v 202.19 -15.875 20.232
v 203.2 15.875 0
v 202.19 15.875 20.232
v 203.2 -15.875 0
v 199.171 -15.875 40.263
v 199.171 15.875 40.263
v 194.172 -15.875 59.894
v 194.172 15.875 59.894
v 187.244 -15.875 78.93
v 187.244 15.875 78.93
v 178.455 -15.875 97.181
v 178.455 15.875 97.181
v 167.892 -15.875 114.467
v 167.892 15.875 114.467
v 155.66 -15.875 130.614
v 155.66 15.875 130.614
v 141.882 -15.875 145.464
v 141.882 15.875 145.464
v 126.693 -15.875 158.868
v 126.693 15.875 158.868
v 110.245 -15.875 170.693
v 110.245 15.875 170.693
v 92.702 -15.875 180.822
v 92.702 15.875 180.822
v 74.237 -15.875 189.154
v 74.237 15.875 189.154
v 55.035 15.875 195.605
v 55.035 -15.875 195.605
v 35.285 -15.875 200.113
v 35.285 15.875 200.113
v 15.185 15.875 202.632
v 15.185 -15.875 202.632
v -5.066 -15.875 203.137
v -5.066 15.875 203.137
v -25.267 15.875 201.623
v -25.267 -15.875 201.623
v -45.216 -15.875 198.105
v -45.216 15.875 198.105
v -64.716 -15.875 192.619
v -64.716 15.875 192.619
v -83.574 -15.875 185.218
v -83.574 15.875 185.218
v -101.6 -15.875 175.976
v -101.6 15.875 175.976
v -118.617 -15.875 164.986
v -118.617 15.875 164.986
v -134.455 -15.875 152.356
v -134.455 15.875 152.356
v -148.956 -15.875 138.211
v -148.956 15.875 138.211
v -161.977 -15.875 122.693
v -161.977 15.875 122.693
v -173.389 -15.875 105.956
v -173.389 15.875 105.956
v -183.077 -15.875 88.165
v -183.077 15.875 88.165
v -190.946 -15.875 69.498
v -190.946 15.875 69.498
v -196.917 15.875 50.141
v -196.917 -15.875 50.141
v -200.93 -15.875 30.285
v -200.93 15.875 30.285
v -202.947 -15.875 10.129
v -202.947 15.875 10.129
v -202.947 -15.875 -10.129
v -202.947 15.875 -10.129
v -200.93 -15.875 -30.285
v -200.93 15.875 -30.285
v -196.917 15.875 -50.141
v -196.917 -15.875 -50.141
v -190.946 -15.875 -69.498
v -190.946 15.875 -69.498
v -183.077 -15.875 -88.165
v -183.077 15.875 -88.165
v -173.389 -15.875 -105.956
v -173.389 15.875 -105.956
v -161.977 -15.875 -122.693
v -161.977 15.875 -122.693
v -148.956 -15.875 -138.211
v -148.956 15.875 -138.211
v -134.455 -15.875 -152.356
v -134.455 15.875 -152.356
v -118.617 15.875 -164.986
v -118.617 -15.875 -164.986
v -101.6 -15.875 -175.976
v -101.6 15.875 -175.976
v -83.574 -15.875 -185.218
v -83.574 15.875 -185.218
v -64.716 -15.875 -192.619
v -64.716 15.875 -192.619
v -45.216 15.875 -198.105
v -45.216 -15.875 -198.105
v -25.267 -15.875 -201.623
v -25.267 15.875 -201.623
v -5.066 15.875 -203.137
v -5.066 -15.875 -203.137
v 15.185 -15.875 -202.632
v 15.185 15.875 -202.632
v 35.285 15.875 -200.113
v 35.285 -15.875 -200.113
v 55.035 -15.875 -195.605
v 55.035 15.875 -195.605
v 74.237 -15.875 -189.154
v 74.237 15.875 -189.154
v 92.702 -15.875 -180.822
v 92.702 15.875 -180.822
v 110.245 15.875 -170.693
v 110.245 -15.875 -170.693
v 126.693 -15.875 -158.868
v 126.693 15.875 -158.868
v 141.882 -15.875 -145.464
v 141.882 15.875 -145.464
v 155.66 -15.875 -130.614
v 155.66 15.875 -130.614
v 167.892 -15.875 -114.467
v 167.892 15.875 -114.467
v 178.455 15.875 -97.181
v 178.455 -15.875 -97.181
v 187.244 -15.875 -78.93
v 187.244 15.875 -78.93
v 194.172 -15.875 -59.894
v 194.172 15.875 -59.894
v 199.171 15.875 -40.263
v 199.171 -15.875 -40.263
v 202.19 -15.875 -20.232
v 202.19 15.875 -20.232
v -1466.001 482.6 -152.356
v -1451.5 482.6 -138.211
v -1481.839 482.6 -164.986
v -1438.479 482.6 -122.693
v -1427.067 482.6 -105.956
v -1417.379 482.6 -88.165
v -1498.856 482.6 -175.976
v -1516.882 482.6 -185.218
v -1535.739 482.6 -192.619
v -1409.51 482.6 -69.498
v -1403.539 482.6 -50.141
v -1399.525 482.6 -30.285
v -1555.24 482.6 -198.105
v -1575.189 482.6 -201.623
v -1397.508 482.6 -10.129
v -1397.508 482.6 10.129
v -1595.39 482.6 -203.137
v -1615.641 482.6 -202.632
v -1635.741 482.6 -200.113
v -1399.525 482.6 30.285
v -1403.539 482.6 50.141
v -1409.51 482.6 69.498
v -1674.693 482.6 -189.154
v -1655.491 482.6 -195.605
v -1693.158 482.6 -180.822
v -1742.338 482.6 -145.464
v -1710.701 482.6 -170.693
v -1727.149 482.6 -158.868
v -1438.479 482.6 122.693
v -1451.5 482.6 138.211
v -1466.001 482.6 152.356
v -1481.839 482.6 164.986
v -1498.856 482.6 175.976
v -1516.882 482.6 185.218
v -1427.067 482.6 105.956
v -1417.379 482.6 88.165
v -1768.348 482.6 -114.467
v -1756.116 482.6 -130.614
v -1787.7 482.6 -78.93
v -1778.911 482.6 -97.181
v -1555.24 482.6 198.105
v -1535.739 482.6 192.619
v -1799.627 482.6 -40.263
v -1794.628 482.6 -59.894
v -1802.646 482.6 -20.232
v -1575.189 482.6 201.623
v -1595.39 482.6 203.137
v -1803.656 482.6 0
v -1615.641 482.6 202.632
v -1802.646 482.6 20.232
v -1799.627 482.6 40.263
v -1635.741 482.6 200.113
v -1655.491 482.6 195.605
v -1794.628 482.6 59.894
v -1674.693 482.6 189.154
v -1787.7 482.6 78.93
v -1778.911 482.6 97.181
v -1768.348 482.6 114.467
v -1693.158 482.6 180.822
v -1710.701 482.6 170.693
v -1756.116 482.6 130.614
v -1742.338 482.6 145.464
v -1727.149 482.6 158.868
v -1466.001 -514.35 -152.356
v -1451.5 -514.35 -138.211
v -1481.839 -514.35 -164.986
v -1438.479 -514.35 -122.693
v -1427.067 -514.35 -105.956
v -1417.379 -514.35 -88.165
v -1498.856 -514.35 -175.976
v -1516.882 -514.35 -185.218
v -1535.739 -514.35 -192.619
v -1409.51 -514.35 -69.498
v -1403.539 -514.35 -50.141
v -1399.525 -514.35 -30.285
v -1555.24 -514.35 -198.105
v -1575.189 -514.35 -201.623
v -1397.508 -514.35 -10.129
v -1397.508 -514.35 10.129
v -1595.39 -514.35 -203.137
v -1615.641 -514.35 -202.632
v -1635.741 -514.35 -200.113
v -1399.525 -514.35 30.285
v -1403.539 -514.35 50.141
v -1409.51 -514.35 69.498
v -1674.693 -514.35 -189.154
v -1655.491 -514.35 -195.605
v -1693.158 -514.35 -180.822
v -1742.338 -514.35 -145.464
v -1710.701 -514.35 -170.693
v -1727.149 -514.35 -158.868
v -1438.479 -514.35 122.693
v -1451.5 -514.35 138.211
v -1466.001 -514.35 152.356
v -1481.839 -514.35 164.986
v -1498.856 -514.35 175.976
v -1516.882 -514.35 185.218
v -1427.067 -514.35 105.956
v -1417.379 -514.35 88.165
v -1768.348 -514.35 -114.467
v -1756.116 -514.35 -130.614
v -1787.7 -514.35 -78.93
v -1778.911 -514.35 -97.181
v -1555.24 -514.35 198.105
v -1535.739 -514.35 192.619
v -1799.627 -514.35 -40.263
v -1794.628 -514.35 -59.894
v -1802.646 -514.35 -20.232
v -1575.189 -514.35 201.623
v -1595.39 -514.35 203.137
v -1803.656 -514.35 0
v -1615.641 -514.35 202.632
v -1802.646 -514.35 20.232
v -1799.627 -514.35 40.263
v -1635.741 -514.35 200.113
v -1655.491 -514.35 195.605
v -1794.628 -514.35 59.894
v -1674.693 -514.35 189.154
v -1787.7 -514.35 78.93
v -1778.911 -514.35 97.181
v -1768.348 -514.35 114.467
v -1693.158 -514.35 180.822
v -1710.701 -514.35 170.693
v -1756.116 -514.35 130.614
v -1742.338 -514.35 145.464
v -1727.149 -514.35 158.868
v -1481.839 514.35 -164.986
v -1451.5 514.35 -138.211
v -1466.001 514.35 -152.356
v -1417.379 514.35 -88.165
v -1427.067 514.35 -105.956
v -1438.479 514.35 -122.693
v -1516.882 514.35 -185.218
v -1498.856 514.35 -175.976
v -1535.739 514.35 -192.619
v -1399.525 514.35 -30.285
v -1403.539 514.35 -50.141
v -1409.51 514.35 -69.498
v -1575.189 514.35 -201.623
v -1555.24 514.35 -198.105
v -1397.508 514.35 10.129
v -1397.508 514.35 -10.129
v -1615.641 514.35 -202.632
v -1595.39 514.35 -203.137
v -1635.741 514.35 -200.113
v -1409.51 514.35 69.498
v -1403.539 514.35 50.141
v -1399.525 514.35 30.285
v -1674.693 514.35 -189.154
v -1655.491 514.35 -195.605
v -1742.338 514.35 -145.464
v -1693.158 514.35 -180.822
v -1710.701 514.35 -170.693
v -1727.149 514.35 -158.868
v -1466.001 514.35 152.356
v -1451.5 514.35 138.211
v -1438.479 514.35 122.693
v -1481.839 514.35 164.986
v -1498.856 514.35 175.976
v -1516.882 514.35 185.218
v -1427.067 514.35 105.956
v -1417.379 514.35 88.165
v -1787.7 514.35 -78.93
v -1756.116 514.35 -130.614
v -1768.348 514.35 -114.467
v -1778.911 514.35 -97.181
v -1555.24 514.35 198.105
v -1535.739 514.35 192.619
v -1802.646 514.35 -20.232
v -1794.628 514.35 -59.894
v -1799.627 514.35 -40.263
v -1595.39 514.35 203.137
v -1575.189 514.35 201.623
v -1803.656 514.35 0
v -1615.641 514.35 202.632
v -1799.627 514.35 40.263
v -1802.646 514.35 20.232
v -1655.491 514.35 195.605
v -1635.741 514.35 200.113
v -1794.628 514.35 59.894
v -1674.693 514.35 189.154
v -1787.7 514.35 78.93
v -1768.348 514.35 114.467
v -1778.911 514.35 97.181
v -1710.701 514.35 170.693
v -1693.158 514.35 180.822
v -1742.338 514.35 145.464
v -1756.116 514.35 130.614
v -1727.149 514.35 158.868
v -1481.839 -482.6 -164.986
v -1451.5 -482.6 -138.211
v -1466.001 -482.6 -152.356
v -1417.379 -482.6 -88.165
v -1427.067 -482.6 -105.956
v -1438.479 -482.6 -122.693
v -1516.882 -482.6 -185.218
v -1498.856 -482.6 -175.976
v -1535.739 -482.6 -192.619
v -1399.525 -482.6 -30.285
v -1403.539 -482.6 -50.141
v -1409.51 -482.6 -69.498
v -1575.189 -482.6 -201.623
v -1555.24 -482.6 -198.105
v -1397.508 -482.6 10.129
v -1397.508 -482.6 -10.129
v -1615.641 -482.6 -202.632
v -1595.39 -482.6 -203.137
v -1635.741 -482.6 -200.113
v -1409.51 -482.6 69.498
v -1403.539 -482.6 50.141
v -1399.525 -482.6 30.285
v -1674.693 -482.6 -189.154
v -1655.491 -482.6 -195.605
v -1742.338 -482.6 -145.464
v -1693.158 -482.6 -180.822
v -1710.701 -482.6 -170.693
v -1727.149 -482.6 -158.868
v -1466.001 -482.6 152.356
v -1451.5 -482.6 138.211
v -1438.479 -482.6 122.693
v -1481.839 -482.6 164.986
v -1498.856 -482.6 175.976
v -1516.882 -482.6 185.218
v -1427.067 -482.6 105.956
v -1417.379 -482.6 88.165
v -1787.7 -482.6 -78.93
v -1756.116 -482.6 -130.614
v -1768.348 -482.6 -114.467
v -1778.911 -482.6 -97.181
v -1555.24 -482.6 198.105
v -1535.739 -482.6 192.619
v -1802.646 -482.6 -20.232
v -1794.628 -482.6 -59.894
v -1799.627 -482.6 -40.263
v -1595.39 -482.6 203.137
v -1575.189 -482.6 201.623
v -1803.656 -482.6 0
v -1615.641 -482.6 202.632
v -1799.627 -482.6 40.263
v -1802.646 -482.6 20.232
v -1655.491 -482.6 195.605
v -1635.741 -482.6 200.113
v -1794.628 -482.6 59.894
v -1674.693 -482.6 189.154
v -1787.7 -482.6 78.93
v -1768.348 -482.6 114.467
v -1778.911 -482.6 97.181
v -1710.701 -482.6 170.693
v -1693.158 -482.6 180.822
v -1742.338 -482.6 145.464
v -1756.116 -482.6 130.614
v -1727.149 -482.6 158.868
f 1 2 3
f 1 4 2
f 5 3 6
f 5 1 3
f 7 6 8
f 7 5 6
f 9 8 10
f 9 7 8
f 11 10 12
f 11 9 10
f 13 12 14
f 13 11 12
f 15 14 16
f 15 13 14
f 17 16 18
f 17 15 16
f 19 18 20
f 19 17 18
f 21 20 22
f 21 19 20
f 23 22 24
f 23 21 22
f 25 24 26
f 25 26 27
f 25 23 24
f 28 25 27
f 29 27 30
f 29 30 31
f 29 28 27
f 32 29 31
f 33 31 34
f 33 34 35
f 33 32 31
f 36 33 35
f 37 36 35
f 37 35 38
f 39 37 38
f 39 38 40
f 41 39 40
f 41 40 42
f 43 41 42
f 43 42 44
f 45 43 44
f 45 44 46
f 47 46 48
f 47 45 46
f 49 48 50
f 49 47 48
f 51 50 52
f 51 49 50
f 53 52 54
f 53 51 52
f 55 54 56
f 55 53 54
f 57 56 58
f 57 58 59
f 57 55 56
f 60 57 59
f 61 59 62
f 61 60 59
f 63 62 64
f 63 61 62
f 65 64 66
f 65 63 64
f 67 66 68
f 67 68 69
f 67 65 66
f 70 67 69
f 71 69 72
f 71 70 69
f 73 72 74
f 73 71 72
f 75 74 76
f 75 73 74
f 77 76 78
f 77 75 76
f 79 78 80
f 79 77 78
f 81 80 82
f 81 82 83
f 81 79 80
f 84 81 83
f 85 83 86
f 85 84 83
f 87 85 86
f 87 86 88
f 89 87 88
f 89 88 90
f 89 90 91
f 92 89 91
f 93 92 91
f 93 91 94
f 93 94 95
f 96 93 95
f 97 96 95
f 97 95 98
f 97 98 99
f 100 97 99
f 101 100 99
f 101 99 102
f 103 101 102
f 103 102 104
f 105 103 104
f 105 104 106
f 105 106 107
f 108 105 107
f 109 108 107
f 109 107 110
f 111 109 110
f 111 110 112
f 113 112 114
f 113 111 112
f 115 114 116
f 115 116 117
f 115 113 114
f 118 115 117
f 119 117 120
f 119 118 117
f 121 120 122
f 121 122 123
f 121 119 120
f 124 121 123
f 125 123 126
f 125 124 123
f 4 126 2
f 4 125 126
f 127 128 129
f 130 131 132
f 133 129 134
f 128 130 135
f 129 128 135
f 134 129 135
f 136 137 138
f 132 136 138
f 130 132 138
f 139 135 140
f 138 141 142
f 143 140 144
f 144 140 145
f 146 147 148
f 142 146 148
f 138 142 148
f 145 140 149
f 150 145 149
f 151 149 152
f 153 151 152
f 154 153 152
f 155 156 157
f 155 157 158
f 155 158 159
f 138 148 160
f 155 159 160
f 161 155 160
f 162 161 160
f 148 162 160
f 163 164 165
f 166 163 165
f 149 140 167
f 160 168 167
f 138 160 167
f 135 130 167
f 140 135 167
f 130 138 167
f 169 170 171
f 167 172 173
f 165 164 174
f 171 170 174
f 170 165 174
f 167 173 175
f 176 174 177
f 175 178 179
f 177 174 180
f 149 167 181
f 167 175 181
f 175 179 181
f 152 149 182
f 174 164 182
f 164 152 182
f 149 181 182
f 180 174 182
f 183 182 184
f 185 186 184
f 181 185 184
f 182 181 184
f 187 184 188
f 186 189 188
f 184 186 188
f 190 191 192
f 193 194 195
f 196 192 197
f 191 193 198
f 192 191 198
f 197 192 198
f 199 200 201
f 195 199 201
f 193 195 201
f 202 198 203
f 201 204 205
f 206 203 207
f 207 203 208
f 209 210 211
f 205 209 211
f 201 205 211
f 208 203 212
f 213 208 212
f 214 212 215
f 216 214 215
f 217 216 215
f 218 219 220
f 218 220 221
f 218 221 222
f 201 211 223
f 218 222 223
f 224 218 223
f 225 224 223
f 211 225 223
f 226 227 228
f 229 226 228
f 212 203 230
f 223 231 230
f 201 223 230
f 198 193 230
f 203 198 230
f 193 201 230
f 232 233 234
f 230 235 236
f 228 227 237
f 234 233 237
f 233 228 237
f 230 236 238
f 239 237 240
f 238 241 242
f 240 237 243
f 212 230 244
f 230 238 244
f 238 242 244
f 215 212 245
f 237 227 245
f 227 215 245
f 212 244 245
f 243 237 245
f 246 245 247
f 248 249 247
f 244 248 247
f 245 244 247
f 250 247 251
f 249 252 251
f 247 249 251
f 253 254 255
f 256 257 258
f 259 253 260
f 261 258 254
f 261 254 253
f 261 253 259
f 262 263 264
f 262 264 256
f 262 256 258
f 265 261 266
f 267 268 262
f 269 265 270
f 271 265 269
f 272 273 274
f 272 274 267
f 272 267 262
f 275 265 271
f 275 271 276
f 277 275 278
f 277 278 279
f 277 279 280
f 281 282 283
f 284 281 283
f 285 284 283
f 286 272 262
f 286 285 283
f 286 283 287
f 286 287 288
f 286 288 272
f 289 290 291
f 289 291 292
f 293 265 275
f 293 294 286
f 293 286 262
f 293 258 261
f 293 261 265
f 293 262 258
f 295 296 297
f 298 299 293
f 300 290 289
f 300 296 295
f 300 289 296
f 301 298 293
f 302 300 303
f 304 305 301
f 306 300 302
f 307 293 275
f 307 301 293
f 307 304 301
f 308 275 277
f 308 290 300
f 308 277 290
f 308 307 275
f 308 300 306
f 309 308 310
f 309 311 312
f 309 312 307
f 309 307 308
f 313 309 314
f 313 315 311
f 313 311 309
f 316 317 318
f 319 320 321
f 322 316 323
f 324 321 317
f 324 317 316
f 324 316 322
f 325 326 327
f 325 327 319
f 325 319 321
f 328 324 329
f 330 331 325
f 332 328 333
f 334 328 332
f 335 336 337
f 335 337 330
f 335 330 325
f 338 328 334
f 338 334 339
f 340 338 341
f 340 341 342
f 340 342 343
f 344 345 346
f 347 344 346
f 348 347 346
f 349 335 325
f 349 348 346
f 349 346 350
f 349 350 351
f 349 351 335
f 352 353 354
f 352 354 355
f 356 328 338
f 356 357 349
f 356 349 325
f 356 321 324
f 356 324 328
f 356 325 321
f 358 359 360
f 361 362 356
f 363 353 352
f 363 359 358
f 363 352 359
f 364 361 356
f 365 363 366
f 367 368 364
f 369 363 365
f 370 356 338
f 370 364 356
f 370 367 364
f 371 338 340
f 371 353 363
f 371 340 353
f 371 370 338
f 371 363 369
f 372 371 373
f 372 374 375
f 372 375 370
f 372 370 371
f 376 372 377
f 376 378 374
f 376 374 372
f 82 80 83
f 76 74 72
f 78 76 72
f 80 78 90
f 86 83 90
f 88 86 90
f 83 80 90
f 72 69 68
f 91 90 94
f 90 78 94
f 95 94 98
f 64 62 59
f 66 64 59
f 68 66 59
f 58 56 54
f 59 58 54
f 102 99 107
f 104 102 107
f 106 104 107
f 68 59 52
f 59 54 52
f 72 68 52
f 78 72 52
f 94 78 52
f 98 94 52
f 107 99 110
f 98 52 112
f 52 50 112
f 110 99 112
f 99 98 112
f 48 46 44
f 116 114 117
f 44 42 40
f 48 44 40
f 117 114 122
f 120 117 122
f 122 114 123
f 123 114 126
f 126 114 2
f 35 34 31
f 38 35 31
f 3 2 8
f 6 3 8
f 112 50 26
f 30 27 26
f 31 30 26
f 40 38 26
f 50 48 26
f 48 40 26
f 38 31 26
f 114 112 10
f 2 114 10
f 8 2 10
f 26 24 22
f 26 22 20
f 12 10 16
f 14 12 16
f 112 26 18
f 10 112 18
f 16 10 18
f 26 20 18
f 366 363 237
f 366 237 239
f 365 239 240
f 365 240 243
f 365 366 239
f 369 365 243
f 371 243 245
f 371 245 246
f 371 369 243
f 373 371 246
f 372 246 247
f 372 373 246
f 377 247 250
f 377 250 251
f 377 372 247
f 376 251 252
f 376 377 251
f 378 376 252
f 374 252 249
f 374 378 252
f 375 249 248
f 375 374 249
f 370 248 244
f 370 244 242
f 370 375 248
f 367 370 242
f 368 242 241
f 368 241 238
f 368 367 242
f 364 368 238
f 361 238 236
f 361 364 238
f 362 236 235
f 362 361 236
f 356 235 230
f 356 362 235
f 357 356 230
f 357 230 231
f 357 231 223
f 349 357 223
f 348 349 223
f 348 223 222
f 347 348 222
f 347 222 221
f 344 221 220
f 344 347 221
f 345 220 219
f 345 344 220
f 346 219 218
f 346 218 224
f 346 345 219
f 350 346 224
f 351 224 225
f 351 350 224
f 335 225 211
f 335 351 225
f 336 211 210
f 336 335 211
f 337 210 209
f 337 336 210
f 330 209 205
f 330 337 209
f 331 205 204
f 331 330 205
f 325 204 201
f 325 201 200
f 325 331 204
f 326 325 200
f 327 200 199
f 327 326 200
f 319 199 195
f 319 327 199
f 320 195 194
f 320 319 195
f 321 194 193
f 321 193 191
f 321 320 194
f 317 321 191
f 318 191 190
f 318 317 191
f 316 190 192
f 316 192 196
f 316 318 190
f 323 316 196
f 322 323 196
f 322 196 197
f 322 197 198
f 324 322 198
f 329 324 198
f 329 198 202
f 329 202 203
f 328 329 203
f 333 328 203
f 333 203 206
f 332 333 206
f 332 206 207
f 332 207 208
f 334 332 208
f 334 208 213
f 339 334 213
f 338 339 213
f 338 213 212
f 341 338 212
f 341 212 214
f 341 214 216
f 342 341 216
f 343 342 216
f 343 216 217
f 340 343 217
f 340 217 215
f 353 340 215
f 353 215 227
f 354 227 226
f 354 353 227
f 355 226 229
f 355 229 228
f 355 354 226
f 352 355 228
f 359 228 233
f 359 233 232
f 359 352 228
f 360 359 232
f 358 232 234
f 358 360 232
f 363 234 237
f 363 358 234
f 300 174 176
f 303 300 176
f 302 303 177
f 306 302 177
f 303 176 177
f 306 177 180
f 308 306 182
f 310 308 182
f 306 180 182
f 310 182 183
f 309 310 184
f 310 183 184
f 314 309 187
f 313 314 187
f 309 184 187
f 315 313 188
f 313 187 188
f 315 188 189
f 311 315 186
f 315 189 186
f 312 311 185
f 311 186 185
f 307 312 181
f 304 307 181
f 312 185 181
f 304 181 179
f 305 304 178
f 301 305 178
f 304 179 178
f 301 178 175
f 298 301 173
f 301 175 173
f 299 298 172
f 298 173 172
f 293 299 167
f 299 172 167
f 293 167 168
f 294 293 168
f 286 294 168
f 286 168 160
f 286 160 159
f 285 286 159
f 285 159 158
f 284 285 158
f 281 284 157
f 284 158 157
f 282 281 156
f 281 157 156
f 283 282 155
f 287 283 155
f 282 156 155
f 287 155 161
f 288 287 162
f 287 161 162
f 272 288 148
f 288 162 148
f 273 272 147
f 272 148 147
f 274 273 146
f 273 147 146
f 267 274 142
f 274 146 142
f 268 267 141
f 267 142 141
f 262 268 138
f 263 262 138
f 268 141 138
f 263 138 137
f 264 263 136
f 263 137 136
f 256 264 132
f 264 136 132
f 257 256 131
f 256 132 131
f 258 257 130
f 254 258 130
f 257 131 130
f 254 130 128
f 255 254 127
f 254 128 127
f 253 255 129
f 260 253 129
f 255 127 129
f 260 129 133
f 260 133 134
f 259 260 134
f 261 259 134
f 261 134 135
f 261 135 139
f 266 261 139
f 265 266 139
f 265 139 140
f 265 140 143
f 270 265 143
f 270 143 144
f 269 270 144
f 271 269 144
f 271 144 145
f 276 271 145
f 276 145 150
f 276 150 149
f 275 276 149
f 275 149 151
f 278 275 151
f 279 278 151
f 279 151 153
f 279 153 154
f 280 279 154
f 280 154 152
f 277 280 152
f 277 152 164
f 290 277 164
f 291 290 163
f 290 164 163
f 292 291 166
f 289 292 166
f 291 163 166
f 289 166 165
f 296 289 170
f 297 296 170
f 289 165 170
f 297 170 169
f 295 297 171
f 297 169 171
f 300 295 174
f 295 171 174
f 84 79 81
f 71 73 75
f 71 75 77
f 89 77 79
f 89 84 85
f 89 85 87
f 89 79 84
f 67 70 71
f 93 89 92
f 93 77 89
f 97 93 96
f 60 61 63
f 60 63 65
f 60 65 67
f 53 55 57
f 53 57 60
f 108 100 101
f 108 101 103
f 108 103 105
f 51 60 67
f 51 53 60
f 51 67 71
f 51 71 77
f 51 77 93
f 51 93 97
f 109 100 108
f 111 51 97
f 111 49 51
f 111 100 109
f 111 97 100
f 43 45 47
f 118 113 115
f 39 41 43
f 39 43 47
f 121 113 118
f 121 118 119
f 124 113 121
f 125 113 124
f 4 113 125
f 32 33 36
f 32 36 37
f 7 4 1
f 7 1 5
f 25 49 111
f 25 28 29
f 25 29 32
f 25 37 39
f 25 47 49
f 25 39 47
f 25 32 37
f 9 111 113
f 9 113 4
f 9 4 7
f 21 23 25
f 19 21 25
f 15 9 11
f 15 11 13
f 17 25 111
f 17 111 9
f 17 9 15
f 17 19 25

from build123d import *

# Parameters (mm, degrees)
F0_R      = 203.2
F1_DEPTH  = 15.875
F7_R      = 203.2
F8_DEPTH  = 31.75
F9_R      = 203.2
F10_DEPTH = 31.75


# Not quite as in the source:
# - the program builds the solid bodies; features that only make, move or delete a surface that nothing else refers to are left out


with BuildPart() as f1:
    # F0 (on Front) → F1 (new body, symmetric)
    with BuildSketch(Plane.XZ):
        Circle(F0_R)
    extrude(amount=F1_DEPTH, both=True)


with BuildPart() as f8:
    # F7 (on plane+point) → F8 (new body)
    with BuildSketch(Plane(origin=(0, 482.6, 0), x_dir=(-1, 0, 0), z_dir=(0, 1, 0))):
        with Locations((1600.4558962578, 0)):
            Circle(F7_R)
    extrude(amount=F8_DEPTH)


with BuildPart() as f10:
    # F9 (on plane+point) → F10 (new body)
    with BuildSketch(Plane(origin=(0, -482.6, 0), x_dir=(-1, 0, 0), z_dir=(0, 1, 0))):
        with Locations((1600.4558962578, 0)):
            Circle(F9_R)
    extrude(amount=-F10_DEPTH)


solid = Compound([f1.part, f8.part, f10.part])
